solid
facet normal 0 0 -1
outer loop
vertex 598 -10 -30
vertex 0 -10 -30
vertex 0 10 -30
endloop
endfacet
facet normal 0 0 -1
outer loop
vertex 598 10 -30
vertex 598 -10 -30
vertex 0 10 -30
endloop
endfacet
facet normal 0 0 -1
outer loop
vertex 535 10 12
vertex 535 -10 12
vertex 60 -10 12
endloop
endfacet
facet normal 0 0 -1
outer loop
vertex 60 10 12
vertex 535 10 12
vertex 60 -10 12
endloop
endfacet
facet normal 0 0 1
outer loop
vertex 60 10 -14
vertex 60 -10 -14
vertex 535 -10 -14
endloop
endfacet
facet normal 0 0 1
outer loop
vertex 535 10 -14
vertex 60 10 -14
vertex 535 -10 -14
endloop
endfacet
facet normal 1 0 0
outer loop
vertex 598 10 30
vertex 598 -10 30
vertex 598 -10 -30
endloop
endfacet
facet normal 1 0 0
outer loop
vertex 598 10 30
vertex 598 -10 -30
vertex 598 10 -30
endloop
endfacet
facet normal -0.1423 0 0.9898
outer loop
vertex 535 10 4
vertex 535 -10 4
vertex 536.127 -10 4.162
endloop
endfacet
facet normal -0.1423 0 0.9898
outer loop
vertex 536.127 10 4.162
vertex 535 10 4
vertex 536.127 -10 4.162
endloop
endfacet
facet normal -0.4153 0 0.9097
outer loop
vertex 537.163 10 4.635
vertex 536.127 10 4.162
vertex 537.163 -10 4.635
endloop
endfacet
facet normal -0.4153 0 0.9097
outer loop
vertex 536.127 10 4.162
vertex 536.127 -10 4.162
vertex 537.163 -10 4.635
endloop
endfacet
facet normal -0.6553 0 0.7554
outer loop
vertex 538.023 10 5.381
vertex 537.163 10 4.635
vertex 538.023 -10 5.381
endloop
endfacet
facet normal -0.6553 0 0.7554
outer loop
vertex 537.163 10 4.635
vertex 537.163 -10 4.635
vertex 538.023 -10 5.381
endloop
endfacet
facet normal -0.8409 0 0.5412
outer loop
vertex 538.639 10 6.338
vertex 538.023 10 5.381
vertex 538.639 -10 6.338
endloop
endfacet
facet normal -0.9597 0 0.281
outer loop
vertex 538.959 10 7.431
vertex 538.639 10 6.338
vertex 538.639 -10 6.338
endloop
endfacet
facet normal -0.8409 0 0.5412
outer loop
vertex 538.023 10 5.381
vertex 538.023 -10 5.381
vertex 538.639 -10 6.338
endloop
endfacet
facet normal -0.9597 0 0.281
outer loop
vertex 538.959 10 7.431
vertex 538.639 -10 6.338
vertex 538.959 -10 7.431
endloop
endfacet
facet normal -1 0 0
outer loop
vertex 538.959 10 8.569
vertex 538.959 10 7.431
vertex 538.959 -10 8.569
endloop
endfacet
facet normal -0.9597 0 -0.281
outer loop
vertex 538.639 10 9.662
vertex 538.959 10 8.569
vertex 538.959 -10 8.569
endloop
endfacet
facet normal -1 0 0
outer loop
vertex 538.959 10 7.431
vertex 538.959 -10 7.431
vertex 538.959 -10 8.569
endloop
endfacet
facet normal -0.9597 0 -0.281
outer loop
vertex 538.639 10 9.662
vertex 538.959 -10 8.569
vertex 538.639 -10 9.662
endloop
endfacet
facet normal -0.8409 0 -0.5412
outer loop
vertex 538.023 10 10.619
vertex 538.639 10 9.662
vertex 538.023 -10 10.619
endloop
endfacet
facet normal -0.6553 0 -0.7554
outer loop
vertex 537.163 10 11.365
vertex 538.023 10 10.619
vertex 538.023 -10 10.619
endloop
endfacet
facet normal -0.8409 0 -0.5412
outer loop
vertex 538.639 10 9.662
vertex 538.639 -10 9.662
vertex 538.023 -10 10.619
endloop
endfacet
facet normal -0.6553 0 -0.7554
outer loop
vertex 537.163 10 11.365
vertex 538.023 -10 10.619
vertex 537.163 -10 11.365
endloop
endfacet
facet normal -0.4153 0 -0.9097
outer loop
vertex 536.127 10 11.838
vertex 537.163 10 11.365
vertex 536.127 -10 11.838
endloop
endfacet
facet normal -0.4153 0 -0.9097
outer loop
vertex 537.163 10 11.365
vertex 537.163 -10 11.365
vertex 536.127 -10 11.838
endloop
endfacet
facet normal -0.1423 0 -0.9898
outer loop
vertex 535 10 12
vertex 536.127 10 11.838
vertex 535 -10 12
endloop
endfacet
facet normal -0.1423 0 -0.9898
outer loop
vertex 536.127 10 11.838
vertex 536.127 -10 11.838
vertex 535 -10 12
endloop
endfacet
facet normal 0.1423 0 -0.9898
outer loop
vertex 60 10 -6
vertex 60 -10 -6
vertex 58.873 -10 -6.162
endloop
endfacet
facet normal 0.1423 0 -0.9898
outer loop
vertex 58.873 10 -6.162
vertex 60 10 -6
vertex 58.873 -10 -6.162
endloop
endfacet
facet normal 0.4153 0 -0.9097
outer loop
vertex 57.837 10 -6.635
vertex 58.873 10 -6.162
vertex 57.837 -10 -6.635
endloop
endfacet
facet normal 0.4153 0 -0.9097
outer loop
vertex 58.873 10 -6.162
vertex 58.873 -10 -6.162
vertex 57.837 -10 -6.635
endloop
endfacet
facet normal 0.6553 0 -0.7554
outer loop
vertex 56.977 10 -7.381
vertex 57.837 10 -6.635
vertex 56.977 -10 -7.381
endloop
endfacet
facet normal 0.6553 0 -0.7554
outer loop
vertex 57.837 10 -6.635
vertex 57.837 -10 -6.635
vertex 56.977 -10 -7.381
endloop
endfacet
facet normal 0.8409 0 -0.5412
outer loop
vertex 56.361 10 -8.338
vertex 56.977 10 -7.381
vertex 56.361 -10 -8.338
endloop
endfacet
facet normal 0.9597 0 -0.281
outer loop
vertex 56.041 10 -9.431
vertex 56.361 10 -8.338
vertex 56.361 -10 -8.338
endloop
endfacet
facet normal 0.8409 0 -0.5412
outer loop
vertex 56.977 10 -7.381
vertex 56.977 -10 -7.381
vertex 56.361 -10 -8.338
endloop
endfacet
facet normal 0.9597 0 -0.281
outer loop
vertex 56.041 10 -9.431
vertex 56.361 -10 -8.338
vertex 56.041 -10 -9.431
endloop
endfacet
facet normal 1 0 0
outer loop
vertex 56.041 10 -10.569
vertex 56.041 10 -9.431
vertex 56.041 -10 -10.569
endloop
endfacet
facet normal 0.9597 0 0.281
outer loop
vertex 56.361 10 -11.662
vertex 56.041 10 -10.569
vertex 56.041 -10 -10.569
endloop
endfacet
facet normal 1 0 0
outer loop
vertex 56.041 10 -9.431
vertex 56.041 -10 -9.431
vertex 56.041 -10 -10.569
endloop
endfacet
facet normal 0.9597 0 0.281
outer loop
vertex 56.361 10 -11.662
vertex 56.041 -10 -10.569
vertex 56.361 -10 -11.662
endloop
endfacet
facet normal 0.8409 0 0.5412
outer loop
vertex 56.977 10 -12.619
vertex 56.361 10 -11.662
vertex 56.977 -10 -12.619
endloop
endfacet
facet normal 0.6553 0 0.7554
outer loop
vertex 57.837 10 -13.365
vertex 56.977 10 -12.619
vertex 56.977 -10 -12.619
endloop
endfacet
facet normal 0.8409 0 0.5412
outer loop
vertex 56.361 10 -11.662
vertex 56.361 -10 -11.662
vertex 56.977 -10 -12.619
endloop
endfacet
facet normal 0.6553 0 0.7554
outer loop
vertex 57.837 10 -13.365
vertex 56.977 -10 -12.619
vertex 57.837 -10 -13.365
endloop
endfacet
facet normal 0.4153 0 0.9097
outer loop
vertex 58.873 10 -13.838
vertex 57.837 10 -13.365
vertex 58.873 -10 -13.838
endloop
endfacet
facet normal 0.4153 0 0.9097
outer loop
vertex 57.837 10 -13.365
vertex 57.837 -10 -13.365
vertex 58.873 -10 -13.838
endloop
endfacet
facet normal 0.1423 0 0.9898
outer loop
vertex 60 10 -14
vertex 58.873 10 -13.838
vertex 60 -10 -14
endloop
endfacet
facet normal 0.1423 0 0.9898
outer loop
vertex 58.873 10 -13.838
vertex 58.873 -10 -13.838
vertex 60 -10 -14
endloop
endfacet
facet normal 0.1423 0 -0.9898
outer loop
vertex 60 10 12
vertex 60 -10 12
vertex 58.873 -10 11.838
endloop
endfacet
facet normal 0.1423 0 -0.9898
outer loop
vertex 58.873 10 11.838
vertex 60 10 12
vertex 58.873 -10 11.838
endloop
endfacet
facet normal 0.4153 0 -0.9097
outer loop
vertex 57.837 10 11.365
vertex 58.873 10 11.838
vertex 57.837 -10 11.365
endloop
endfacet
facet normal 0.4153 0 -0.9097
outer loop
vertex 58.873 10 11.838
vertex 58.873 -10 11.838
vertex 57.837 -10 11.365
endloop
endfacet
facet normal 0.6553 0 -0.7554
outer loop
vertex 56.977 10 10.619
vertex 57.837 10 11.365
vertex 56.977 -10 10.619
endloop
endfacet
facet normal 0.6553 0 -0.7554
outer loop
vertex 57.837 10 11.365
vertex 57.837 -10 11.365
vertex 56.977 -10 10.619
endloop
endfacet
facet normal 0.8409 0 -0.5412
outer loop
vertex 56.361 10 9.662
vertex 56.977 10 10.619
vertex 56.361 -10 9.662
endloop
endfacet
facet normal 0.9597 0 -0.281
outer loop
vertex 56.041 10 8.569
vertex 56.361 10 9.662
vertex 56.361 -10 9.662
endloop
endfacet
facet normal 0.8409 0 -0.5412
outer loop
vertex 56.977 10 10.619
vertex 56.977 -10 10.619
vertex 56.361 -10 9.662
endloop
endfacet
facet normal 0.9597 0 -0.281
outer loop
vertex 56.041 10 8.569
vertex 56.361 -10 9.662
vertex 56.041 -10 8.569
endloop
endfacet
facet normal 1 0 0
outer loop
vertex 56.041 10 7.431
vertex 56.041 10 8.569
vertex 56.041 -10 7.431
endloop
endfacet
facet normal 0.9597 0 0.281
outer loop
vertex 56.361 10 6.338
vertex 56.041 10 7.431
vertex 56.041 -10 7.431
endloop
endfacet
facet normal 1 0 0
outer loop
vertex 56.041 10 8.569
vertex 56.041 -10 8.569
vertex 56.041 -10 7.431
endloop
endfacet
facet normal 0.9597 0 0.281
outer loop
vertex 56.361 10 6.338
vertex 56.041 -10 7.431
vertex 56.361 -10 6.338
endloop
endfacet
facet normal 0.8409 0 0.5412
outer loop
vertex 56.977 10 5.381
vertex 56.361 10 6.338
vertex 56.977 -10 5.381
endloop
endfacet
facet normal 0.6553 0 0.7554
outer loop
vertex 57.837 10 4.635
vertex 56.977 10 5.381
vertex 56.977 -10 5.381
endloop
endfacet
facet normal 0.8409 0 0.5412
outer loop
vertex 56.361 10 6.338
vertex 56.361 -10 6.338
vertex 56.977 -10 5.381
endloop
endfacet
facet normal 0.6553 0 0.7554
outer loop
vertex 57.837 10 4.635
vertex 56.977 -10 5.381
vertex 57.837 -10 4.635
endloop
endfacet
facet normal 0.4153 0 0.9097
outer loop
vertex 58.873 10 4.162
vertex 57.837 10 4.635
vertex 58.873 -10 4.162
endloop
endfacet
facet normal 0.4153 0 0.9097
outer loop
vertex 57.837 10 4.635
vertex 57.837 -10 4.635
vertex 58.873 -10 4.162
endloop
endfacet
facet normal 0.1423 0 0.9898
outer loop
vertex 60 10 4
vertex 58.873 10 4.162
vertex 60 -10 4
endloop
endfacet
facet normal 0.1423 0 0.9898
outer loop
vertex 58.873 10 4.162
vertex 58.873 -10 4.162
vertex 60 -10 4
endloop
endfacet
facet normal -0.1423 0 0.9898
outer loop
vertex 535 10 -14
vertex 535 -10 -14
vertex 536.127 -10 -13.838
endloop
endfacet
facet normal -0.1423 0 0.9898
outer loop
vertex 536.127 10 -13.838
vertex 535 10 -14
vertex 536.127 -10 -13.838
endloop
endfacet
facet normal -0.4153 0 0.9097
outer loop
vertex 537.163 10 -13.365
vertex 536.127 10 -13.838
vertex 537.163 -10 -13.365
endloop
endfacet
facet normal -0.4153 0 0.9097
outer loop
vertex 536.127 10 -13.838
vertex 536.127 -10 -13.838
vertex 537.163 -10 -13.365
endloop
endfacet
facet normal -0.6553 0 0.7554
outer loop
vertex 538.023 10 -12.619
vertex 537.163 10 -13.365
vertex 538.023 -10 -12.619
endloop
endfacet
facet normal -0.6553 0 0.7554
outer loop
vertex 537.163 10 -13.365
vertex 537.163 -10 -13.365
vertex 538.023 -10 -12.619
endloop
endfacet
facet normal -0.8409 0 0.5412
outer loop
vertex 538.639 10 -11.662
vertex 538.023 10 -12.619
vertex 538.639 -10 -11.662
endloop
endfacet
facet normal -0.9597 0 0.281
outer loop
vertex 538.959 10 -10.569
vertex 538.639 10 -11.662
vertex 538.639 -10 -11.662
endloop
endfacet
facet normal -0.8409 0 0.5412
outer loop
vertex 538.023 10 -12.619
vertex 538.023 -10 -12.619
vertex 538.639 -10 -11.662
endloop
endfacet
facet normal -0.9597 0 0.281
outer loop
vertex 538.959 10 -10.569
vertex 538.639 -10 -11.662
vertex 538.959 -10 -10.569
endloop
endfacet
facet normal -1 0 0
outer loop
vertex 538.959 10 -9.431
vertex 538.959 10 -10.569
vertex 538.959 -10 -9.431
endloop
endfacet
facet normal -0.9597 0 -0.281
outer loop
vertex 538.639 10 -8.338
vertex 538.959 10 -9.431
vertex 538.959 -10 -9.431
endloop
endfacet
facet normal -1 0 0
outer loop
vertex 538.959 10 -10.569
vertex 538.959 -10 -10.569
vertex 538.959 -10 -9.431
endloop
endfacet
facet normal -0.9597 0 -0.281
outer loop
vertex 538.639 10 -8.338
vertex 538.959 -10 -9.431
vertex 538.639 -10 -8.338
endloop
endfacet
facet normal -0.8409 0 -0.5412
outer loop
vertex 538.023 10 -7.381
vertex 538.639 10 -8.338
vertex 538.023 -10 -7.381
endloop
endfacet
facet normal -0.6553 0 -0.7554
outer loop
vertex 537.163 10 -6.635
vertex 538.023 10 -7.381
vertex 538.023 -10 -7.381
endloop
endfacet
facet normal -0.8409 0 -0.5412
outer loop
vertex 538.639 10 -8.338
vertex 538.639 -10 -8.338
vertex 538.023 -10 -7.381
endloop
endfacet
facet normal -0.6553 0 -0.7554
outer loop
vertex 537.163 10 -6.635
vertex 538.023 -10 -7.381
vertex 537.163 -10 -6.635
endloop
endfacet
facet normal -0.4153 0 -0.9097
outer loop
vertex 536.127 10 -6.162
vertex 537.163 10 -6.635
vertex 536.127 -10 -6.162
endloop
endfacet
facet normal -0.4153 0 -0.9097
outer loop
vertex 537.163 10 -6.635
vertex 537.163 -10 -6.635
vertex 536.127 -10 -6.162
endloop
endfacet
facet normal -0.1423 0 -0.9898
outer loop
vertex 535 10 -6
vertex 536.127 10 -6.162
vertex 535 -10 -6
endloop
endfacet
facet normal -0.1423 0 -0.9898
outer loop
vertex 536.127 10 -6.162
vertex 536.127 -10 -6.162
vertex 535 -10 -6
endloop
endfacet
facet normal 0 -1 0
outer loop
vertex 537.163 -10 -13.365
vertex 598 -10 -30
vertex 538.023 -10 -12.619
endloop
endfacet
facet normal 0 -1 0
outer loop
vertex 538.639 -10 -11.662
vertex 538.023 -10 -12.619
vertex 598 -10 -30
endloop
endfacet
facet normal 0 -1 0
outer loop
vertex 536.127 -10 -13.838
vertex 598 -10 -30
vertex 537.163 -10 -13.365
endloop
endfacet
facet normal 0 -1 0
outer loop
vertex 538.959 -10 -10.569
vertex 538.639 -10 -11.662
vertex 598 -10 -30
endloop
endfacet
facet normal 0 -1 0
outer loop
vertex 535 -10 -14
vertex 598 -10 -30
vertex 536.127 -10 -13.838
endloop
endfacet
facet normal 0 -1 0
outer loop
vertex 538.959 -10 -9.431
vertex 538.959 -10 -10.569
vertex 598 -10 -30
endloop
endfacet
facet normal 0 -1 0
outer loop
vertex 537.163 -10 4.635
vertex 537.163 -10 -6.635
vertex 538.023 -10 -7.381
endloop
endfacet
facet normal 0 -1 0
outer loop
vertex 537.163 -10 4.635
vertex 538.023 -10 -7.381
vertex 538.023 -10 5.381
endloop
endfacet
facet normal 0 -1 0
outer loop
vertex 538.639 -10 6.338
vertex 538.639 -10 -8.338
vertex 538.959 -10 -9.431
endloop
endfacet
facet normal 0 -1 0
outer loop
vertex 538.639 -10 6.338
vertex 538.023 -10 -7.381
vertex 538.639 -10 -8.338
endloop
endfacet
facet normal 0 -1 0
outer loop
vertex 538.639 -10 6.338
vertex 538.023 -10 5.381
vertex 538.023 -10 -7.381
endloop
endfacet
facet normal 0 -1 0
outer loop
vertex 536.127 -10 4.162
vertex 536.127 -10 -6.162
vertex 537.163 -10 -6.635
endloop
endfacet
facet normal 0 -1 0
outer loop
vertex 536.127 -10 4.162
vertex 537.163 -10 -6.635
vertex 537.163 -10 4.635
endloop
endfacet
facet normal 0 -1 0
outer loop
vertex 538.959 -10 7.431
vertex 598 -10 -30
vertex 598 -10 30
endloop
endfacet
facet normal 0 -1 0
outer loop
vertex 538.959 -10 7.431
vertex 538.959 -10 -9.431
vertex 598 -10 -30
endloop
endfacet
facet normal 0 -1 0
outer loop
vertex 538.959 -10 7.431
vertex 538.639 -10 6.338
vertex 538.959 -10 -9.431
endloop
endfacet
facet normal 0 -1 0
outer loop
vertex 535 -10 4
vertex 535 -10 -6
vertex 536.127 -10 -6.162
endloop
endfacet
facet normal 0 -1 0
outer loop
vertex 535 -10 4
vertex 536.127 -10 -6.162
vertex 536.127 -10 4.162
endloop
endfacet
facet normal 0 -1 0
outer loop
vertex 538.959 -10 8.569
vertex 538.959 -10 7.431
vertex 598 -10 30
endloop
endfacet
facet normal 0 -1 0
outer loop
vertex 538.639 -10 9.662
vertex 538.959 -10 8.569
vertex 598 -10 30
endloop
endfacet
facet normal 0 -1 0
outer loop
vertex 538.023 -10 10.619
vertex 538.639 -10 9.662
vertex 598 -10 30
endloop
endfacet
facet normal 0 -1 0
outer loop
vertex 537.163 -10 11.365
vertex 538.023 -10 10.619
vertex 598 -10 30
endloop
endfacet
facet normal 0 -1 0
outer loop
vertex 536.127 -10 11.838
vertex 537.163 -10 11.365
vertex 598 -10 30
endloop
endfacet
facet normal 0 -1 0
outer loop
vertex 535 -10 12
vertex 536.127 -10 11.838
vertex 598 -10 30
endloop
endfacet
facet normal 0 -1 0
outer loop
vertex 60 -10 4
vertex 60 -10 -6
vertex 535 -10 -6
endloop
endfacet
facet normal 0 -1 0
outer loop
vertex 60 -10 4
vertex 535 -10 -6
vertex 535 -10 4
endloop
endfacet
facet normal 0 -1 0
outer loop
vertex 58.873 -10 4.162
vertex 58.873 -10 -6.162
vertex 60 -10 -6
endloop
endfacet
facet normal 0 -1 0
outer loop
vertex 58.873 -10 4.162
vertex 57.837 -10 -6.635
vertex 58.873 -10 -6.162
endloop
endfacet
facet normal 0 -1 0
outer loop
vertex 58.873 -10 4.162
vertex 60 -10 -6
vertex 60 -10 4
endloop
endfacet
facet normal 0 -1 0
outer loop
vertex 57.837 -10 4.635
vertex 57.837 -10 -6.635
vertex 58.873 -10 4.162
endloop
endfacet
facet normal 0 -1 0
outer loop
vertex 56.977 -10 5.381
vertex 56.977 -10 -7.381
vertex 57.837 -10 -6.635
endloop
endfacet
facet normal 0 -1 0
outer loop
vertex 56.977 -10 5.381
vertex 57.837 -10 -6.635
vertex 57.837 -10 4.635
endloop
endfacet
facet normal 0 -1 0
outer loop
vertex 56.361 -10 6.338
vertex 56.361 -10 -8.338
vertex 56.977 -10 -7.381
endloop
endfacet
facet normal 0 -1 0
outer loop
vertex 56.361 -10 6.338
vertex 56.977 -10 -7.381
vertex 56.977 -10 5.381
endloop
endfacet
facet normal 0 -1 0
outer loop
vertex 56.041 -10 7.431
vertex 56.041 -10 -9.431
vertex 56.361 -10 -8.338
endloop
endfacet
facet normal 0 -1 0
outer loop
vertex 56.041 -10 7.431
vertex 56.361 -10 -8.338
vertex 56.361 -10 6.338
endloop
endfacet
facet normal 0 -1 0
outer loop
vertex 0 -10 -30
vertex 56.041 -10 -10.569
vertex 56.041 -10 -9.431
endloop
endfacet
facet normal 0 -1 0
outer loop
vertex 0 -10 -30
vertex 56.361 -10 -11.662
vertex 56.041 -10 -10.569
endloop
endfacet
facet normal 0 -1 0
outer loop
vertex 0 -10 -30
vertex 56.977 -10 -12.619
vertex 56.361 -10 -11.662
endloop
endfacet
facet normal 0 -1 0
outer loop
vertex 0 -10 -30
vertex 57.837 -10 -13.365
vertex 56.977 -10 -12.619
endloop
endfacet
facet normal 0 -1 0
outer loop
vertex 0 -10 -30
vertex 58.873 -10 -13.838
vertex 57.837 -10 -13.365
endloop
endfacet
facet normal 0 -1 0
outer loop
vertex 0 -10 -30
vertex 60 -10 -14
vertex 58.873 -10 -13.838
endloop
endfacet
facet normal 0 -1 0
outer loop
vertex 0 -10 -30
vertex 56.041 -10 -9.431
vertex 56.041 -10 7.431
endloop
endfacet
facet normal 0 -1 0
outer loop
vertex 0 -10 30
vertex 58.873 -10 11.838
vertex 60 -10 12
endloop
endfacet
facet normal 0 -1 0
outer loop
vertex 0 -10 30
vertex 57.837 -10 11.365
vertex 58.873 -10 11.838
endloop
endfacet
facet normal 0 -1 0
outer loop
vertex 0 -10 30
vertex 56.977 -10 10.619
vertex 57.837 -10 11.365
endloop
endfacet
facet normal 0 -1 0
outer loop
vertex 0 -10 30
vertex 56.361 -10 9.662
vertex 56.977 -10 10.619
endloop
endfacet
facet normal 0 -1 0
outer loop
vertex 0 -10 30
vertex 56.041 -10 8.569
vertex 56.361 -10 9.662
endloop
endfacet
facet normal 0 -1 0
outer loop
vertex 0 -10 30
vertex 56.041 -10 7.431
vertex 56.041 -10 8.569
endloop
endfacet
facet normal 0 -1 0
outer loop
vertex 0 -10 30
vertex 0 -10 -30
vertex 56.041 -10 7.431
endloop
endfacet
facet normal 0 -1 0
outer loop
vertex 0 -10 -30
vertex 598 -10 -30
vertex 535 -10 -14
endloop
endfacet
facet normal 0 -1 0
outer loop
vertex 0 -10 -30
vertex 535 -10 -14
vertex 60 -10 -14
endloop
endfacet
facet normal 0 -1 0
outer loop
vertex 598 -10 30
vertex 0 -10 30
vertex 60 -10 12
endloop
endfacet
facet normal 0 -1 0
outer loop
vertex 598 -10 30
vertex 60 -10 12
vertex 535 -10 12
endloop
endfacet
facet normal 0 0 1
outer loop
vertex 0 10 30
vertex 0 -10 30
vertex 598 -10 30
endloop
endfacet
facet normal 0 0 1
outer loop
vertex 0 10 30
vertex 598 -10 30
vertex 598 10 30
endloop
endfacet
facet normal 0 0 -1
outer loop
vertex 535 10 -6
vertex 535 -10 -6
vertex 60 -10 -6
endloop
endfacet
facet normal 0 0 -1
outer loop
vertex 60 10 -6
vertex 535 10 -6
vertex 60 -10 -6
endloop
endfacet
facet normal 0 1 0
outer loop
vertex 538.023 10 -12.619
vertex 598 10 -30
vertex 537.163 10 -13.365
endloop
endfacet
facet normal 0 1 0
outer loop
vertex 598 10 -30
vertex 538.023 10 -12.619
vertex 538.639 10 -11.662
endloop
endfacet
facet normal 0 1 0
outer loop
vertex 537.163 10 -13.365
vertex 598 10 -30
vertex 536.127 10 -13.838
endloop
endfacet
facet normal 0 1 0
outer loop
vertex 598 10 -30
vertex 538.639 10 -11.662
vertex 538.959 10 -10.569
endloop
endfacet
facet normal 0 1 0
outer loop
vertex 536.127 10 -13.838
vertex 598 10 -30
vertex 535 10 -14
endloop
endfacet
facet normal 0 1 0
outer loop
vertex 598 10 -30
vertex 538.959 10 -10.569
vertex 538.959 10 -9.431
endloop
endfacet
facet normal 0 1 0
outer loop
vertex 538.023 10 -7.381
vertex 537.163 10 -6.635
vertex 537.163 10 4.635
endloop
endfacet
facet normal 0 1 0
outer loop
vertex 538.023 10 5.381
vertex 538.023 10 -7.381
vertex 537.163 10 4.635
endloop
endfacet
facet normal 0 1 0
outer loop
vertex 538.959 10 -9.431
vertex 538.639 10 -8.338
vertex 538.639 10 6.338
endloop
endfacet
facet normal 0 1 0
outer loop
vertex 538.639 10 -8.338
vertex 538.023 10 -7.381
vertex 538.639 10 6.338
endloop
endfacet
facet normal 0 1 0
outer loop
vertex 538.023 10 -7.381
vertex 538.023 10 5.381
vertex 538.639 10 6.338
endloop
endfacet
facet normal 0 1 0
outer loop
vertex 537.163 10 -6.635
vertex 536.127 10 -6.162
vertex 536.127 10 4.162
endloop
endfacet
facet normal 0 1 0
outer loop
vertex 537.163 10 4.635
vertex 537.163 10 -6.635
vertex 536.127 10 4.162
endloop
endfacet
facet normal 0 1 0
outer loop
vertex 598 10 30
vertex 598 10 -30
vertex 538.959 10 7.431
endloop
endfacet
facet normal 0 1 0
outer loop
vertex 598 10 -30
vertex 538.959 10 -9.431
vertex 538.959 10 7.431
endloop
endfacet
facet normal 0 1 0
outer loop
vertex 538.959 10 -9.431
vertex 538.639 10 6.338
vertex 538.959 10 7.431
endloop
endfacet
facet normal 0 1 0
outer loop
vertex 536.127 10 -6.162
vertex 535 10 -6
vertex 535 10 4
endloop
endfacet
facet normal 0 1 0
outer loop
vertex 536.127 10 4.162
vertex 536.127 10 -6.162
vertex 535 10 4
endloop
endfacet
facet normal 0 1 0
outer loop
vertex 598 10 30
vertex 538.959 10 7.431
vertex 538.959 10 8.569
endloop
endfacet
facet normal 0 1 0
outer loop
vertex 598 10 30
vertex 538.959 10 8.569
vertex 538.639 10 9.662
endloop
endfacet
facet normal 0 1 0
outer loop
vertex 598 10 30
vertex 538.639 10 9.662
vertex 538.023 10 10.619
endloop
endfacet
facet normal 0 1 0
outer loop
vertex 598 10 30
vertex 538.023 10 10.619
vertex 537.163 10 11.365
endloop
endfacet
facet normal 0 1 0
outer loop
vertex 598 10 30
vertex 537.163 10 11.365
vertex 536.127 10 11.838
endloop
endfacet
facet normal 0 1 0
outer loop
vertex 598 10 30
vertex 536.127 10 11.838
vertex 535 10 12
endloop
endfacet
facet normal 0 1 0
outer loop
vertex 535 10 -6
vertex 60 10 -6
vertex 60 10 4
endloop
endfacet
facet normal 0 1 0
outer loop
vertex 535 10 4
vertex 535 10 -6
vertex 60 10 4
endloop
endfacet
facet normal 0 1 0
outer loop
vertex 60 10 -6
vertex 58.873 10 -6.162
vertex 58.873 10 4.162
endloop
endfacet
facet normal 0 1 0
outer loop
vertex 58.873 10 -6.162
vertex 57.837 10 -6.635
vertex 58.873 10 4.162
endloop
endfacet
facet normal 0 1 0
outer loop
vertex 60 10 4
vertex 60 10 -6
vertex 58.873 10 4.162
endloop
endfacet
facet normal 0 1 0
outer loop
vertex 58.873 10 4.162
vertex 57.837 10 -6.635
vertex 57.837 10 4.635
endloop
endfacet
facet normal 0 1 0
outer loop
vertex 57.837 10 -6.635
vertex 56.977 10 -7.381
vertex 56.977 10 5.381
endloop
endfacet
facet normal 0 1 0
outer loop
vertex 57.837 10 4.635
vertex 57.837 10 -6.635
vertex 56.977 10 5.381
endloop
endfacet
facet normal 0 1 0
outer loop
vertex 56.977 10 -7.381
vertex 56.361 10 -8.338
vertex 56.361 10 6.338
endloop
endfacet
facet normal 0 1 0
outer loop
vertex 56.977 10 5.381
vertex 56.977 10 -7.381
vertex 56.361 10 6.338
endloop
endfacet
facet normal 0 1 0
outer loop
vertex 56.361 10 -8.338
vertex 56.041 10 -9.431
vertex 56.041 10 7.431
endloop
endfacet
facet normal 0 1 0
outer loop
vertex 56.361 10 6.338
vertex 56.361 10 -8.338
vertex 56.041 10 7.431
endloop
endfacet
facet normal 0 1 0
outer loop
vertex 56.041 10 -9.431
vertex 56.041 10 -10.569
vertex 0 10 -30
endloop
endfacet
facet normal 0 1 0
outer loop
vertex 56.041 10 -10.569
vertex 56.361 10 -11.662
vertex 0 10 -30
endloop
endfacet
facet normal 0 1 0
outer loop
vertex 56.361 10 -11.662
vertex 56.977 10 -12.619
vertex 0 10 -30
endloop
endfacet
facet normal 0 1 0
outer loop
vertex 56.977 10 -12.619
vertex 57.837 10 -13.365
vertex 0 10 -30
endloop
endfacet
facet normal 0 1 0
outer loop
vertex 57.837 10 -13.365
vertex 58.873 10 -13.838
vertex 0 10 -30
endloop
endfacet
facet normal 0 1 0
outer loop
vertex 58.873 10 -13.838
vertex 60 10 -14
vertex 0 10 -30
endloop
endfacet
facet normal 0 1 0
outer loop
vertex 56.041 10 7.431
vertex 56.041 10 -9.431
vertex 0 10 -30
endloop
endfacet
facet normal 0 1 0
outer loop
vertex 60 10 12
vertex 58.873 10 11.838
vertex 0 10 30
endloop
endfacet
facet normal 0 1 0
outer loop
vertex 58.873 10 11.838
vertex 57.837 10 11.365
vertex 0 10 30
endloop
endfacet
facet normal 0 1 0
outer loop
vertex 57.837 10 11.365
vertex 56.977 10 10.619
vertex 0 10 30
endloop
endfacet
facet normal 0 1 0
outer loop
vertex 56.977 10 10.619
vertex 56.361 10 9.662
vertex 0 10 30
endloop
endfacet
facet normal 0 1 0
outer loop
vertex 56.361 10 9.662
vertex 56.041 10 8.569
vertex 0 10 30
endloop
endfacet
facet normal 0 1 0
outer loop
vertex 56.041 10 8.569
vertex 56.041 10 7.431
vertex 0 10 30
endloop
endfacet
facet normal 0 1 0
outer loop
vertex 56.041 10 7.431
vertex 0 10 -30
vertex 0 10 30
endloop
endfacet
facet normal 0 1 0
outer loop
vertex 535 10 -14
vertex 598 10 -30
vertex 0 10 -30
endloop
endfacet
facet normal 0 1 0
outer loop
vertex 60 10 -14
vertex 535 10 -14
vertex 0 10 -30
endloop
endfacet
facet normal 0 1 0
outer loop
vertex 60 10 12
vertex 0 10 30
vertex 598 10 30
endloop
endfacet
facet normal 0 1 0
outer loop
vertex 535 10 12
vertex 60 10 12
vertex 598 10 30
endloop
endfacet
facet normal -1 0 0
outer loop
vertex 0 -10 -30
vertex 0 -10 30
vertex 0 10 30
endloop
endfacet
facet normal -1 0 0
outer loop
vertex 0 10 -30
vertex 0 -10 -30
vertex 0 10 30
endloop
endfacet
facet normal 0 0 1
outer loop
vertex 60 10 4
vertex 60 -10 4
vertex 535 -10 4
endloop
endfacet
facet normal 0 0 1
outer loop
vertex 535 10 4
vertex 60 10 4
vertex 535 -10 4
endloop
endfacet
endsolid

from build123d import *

# Parameters (mm, degrees)
F0_W     = 20
F0_H     = 60
F1_DEPTH = 598
F3_DEPTH = 25


with BuildPart() as f1:
    # F0 (on Right) → F1 (new body)
    with BuildSketch(Plane.YZ):
        Rectangle(F0_W, F0_H)
    extrude(amount=F1_DEPTH)

    # F2 (on face) → F3 (cut)
    with BuildSketch(Plane.XZ.offset(10)):
        with BuildLine():
            Line((535, 12), (60, 12))
            ThreePointArc((60, 12), (56, 8), (60, 4))
            Line((60, 4), (535, 4))
            ThreePointArc((535, 4), (539, 8), (535, 12))
        make_face()
        with BuildLine():
            Line((535, -6), (60, -6))
            ThreePointArc((60, -6), (56, -10), (60, -14))
            Line((60, -14), (535, -14))
            ThreePointArc((535, -14), (539, -10), (535, -6))
        make_face()
    extrude(amount=-F3_DEPTH, mode=Mode.SUBTRACT)


solid = f1.part
